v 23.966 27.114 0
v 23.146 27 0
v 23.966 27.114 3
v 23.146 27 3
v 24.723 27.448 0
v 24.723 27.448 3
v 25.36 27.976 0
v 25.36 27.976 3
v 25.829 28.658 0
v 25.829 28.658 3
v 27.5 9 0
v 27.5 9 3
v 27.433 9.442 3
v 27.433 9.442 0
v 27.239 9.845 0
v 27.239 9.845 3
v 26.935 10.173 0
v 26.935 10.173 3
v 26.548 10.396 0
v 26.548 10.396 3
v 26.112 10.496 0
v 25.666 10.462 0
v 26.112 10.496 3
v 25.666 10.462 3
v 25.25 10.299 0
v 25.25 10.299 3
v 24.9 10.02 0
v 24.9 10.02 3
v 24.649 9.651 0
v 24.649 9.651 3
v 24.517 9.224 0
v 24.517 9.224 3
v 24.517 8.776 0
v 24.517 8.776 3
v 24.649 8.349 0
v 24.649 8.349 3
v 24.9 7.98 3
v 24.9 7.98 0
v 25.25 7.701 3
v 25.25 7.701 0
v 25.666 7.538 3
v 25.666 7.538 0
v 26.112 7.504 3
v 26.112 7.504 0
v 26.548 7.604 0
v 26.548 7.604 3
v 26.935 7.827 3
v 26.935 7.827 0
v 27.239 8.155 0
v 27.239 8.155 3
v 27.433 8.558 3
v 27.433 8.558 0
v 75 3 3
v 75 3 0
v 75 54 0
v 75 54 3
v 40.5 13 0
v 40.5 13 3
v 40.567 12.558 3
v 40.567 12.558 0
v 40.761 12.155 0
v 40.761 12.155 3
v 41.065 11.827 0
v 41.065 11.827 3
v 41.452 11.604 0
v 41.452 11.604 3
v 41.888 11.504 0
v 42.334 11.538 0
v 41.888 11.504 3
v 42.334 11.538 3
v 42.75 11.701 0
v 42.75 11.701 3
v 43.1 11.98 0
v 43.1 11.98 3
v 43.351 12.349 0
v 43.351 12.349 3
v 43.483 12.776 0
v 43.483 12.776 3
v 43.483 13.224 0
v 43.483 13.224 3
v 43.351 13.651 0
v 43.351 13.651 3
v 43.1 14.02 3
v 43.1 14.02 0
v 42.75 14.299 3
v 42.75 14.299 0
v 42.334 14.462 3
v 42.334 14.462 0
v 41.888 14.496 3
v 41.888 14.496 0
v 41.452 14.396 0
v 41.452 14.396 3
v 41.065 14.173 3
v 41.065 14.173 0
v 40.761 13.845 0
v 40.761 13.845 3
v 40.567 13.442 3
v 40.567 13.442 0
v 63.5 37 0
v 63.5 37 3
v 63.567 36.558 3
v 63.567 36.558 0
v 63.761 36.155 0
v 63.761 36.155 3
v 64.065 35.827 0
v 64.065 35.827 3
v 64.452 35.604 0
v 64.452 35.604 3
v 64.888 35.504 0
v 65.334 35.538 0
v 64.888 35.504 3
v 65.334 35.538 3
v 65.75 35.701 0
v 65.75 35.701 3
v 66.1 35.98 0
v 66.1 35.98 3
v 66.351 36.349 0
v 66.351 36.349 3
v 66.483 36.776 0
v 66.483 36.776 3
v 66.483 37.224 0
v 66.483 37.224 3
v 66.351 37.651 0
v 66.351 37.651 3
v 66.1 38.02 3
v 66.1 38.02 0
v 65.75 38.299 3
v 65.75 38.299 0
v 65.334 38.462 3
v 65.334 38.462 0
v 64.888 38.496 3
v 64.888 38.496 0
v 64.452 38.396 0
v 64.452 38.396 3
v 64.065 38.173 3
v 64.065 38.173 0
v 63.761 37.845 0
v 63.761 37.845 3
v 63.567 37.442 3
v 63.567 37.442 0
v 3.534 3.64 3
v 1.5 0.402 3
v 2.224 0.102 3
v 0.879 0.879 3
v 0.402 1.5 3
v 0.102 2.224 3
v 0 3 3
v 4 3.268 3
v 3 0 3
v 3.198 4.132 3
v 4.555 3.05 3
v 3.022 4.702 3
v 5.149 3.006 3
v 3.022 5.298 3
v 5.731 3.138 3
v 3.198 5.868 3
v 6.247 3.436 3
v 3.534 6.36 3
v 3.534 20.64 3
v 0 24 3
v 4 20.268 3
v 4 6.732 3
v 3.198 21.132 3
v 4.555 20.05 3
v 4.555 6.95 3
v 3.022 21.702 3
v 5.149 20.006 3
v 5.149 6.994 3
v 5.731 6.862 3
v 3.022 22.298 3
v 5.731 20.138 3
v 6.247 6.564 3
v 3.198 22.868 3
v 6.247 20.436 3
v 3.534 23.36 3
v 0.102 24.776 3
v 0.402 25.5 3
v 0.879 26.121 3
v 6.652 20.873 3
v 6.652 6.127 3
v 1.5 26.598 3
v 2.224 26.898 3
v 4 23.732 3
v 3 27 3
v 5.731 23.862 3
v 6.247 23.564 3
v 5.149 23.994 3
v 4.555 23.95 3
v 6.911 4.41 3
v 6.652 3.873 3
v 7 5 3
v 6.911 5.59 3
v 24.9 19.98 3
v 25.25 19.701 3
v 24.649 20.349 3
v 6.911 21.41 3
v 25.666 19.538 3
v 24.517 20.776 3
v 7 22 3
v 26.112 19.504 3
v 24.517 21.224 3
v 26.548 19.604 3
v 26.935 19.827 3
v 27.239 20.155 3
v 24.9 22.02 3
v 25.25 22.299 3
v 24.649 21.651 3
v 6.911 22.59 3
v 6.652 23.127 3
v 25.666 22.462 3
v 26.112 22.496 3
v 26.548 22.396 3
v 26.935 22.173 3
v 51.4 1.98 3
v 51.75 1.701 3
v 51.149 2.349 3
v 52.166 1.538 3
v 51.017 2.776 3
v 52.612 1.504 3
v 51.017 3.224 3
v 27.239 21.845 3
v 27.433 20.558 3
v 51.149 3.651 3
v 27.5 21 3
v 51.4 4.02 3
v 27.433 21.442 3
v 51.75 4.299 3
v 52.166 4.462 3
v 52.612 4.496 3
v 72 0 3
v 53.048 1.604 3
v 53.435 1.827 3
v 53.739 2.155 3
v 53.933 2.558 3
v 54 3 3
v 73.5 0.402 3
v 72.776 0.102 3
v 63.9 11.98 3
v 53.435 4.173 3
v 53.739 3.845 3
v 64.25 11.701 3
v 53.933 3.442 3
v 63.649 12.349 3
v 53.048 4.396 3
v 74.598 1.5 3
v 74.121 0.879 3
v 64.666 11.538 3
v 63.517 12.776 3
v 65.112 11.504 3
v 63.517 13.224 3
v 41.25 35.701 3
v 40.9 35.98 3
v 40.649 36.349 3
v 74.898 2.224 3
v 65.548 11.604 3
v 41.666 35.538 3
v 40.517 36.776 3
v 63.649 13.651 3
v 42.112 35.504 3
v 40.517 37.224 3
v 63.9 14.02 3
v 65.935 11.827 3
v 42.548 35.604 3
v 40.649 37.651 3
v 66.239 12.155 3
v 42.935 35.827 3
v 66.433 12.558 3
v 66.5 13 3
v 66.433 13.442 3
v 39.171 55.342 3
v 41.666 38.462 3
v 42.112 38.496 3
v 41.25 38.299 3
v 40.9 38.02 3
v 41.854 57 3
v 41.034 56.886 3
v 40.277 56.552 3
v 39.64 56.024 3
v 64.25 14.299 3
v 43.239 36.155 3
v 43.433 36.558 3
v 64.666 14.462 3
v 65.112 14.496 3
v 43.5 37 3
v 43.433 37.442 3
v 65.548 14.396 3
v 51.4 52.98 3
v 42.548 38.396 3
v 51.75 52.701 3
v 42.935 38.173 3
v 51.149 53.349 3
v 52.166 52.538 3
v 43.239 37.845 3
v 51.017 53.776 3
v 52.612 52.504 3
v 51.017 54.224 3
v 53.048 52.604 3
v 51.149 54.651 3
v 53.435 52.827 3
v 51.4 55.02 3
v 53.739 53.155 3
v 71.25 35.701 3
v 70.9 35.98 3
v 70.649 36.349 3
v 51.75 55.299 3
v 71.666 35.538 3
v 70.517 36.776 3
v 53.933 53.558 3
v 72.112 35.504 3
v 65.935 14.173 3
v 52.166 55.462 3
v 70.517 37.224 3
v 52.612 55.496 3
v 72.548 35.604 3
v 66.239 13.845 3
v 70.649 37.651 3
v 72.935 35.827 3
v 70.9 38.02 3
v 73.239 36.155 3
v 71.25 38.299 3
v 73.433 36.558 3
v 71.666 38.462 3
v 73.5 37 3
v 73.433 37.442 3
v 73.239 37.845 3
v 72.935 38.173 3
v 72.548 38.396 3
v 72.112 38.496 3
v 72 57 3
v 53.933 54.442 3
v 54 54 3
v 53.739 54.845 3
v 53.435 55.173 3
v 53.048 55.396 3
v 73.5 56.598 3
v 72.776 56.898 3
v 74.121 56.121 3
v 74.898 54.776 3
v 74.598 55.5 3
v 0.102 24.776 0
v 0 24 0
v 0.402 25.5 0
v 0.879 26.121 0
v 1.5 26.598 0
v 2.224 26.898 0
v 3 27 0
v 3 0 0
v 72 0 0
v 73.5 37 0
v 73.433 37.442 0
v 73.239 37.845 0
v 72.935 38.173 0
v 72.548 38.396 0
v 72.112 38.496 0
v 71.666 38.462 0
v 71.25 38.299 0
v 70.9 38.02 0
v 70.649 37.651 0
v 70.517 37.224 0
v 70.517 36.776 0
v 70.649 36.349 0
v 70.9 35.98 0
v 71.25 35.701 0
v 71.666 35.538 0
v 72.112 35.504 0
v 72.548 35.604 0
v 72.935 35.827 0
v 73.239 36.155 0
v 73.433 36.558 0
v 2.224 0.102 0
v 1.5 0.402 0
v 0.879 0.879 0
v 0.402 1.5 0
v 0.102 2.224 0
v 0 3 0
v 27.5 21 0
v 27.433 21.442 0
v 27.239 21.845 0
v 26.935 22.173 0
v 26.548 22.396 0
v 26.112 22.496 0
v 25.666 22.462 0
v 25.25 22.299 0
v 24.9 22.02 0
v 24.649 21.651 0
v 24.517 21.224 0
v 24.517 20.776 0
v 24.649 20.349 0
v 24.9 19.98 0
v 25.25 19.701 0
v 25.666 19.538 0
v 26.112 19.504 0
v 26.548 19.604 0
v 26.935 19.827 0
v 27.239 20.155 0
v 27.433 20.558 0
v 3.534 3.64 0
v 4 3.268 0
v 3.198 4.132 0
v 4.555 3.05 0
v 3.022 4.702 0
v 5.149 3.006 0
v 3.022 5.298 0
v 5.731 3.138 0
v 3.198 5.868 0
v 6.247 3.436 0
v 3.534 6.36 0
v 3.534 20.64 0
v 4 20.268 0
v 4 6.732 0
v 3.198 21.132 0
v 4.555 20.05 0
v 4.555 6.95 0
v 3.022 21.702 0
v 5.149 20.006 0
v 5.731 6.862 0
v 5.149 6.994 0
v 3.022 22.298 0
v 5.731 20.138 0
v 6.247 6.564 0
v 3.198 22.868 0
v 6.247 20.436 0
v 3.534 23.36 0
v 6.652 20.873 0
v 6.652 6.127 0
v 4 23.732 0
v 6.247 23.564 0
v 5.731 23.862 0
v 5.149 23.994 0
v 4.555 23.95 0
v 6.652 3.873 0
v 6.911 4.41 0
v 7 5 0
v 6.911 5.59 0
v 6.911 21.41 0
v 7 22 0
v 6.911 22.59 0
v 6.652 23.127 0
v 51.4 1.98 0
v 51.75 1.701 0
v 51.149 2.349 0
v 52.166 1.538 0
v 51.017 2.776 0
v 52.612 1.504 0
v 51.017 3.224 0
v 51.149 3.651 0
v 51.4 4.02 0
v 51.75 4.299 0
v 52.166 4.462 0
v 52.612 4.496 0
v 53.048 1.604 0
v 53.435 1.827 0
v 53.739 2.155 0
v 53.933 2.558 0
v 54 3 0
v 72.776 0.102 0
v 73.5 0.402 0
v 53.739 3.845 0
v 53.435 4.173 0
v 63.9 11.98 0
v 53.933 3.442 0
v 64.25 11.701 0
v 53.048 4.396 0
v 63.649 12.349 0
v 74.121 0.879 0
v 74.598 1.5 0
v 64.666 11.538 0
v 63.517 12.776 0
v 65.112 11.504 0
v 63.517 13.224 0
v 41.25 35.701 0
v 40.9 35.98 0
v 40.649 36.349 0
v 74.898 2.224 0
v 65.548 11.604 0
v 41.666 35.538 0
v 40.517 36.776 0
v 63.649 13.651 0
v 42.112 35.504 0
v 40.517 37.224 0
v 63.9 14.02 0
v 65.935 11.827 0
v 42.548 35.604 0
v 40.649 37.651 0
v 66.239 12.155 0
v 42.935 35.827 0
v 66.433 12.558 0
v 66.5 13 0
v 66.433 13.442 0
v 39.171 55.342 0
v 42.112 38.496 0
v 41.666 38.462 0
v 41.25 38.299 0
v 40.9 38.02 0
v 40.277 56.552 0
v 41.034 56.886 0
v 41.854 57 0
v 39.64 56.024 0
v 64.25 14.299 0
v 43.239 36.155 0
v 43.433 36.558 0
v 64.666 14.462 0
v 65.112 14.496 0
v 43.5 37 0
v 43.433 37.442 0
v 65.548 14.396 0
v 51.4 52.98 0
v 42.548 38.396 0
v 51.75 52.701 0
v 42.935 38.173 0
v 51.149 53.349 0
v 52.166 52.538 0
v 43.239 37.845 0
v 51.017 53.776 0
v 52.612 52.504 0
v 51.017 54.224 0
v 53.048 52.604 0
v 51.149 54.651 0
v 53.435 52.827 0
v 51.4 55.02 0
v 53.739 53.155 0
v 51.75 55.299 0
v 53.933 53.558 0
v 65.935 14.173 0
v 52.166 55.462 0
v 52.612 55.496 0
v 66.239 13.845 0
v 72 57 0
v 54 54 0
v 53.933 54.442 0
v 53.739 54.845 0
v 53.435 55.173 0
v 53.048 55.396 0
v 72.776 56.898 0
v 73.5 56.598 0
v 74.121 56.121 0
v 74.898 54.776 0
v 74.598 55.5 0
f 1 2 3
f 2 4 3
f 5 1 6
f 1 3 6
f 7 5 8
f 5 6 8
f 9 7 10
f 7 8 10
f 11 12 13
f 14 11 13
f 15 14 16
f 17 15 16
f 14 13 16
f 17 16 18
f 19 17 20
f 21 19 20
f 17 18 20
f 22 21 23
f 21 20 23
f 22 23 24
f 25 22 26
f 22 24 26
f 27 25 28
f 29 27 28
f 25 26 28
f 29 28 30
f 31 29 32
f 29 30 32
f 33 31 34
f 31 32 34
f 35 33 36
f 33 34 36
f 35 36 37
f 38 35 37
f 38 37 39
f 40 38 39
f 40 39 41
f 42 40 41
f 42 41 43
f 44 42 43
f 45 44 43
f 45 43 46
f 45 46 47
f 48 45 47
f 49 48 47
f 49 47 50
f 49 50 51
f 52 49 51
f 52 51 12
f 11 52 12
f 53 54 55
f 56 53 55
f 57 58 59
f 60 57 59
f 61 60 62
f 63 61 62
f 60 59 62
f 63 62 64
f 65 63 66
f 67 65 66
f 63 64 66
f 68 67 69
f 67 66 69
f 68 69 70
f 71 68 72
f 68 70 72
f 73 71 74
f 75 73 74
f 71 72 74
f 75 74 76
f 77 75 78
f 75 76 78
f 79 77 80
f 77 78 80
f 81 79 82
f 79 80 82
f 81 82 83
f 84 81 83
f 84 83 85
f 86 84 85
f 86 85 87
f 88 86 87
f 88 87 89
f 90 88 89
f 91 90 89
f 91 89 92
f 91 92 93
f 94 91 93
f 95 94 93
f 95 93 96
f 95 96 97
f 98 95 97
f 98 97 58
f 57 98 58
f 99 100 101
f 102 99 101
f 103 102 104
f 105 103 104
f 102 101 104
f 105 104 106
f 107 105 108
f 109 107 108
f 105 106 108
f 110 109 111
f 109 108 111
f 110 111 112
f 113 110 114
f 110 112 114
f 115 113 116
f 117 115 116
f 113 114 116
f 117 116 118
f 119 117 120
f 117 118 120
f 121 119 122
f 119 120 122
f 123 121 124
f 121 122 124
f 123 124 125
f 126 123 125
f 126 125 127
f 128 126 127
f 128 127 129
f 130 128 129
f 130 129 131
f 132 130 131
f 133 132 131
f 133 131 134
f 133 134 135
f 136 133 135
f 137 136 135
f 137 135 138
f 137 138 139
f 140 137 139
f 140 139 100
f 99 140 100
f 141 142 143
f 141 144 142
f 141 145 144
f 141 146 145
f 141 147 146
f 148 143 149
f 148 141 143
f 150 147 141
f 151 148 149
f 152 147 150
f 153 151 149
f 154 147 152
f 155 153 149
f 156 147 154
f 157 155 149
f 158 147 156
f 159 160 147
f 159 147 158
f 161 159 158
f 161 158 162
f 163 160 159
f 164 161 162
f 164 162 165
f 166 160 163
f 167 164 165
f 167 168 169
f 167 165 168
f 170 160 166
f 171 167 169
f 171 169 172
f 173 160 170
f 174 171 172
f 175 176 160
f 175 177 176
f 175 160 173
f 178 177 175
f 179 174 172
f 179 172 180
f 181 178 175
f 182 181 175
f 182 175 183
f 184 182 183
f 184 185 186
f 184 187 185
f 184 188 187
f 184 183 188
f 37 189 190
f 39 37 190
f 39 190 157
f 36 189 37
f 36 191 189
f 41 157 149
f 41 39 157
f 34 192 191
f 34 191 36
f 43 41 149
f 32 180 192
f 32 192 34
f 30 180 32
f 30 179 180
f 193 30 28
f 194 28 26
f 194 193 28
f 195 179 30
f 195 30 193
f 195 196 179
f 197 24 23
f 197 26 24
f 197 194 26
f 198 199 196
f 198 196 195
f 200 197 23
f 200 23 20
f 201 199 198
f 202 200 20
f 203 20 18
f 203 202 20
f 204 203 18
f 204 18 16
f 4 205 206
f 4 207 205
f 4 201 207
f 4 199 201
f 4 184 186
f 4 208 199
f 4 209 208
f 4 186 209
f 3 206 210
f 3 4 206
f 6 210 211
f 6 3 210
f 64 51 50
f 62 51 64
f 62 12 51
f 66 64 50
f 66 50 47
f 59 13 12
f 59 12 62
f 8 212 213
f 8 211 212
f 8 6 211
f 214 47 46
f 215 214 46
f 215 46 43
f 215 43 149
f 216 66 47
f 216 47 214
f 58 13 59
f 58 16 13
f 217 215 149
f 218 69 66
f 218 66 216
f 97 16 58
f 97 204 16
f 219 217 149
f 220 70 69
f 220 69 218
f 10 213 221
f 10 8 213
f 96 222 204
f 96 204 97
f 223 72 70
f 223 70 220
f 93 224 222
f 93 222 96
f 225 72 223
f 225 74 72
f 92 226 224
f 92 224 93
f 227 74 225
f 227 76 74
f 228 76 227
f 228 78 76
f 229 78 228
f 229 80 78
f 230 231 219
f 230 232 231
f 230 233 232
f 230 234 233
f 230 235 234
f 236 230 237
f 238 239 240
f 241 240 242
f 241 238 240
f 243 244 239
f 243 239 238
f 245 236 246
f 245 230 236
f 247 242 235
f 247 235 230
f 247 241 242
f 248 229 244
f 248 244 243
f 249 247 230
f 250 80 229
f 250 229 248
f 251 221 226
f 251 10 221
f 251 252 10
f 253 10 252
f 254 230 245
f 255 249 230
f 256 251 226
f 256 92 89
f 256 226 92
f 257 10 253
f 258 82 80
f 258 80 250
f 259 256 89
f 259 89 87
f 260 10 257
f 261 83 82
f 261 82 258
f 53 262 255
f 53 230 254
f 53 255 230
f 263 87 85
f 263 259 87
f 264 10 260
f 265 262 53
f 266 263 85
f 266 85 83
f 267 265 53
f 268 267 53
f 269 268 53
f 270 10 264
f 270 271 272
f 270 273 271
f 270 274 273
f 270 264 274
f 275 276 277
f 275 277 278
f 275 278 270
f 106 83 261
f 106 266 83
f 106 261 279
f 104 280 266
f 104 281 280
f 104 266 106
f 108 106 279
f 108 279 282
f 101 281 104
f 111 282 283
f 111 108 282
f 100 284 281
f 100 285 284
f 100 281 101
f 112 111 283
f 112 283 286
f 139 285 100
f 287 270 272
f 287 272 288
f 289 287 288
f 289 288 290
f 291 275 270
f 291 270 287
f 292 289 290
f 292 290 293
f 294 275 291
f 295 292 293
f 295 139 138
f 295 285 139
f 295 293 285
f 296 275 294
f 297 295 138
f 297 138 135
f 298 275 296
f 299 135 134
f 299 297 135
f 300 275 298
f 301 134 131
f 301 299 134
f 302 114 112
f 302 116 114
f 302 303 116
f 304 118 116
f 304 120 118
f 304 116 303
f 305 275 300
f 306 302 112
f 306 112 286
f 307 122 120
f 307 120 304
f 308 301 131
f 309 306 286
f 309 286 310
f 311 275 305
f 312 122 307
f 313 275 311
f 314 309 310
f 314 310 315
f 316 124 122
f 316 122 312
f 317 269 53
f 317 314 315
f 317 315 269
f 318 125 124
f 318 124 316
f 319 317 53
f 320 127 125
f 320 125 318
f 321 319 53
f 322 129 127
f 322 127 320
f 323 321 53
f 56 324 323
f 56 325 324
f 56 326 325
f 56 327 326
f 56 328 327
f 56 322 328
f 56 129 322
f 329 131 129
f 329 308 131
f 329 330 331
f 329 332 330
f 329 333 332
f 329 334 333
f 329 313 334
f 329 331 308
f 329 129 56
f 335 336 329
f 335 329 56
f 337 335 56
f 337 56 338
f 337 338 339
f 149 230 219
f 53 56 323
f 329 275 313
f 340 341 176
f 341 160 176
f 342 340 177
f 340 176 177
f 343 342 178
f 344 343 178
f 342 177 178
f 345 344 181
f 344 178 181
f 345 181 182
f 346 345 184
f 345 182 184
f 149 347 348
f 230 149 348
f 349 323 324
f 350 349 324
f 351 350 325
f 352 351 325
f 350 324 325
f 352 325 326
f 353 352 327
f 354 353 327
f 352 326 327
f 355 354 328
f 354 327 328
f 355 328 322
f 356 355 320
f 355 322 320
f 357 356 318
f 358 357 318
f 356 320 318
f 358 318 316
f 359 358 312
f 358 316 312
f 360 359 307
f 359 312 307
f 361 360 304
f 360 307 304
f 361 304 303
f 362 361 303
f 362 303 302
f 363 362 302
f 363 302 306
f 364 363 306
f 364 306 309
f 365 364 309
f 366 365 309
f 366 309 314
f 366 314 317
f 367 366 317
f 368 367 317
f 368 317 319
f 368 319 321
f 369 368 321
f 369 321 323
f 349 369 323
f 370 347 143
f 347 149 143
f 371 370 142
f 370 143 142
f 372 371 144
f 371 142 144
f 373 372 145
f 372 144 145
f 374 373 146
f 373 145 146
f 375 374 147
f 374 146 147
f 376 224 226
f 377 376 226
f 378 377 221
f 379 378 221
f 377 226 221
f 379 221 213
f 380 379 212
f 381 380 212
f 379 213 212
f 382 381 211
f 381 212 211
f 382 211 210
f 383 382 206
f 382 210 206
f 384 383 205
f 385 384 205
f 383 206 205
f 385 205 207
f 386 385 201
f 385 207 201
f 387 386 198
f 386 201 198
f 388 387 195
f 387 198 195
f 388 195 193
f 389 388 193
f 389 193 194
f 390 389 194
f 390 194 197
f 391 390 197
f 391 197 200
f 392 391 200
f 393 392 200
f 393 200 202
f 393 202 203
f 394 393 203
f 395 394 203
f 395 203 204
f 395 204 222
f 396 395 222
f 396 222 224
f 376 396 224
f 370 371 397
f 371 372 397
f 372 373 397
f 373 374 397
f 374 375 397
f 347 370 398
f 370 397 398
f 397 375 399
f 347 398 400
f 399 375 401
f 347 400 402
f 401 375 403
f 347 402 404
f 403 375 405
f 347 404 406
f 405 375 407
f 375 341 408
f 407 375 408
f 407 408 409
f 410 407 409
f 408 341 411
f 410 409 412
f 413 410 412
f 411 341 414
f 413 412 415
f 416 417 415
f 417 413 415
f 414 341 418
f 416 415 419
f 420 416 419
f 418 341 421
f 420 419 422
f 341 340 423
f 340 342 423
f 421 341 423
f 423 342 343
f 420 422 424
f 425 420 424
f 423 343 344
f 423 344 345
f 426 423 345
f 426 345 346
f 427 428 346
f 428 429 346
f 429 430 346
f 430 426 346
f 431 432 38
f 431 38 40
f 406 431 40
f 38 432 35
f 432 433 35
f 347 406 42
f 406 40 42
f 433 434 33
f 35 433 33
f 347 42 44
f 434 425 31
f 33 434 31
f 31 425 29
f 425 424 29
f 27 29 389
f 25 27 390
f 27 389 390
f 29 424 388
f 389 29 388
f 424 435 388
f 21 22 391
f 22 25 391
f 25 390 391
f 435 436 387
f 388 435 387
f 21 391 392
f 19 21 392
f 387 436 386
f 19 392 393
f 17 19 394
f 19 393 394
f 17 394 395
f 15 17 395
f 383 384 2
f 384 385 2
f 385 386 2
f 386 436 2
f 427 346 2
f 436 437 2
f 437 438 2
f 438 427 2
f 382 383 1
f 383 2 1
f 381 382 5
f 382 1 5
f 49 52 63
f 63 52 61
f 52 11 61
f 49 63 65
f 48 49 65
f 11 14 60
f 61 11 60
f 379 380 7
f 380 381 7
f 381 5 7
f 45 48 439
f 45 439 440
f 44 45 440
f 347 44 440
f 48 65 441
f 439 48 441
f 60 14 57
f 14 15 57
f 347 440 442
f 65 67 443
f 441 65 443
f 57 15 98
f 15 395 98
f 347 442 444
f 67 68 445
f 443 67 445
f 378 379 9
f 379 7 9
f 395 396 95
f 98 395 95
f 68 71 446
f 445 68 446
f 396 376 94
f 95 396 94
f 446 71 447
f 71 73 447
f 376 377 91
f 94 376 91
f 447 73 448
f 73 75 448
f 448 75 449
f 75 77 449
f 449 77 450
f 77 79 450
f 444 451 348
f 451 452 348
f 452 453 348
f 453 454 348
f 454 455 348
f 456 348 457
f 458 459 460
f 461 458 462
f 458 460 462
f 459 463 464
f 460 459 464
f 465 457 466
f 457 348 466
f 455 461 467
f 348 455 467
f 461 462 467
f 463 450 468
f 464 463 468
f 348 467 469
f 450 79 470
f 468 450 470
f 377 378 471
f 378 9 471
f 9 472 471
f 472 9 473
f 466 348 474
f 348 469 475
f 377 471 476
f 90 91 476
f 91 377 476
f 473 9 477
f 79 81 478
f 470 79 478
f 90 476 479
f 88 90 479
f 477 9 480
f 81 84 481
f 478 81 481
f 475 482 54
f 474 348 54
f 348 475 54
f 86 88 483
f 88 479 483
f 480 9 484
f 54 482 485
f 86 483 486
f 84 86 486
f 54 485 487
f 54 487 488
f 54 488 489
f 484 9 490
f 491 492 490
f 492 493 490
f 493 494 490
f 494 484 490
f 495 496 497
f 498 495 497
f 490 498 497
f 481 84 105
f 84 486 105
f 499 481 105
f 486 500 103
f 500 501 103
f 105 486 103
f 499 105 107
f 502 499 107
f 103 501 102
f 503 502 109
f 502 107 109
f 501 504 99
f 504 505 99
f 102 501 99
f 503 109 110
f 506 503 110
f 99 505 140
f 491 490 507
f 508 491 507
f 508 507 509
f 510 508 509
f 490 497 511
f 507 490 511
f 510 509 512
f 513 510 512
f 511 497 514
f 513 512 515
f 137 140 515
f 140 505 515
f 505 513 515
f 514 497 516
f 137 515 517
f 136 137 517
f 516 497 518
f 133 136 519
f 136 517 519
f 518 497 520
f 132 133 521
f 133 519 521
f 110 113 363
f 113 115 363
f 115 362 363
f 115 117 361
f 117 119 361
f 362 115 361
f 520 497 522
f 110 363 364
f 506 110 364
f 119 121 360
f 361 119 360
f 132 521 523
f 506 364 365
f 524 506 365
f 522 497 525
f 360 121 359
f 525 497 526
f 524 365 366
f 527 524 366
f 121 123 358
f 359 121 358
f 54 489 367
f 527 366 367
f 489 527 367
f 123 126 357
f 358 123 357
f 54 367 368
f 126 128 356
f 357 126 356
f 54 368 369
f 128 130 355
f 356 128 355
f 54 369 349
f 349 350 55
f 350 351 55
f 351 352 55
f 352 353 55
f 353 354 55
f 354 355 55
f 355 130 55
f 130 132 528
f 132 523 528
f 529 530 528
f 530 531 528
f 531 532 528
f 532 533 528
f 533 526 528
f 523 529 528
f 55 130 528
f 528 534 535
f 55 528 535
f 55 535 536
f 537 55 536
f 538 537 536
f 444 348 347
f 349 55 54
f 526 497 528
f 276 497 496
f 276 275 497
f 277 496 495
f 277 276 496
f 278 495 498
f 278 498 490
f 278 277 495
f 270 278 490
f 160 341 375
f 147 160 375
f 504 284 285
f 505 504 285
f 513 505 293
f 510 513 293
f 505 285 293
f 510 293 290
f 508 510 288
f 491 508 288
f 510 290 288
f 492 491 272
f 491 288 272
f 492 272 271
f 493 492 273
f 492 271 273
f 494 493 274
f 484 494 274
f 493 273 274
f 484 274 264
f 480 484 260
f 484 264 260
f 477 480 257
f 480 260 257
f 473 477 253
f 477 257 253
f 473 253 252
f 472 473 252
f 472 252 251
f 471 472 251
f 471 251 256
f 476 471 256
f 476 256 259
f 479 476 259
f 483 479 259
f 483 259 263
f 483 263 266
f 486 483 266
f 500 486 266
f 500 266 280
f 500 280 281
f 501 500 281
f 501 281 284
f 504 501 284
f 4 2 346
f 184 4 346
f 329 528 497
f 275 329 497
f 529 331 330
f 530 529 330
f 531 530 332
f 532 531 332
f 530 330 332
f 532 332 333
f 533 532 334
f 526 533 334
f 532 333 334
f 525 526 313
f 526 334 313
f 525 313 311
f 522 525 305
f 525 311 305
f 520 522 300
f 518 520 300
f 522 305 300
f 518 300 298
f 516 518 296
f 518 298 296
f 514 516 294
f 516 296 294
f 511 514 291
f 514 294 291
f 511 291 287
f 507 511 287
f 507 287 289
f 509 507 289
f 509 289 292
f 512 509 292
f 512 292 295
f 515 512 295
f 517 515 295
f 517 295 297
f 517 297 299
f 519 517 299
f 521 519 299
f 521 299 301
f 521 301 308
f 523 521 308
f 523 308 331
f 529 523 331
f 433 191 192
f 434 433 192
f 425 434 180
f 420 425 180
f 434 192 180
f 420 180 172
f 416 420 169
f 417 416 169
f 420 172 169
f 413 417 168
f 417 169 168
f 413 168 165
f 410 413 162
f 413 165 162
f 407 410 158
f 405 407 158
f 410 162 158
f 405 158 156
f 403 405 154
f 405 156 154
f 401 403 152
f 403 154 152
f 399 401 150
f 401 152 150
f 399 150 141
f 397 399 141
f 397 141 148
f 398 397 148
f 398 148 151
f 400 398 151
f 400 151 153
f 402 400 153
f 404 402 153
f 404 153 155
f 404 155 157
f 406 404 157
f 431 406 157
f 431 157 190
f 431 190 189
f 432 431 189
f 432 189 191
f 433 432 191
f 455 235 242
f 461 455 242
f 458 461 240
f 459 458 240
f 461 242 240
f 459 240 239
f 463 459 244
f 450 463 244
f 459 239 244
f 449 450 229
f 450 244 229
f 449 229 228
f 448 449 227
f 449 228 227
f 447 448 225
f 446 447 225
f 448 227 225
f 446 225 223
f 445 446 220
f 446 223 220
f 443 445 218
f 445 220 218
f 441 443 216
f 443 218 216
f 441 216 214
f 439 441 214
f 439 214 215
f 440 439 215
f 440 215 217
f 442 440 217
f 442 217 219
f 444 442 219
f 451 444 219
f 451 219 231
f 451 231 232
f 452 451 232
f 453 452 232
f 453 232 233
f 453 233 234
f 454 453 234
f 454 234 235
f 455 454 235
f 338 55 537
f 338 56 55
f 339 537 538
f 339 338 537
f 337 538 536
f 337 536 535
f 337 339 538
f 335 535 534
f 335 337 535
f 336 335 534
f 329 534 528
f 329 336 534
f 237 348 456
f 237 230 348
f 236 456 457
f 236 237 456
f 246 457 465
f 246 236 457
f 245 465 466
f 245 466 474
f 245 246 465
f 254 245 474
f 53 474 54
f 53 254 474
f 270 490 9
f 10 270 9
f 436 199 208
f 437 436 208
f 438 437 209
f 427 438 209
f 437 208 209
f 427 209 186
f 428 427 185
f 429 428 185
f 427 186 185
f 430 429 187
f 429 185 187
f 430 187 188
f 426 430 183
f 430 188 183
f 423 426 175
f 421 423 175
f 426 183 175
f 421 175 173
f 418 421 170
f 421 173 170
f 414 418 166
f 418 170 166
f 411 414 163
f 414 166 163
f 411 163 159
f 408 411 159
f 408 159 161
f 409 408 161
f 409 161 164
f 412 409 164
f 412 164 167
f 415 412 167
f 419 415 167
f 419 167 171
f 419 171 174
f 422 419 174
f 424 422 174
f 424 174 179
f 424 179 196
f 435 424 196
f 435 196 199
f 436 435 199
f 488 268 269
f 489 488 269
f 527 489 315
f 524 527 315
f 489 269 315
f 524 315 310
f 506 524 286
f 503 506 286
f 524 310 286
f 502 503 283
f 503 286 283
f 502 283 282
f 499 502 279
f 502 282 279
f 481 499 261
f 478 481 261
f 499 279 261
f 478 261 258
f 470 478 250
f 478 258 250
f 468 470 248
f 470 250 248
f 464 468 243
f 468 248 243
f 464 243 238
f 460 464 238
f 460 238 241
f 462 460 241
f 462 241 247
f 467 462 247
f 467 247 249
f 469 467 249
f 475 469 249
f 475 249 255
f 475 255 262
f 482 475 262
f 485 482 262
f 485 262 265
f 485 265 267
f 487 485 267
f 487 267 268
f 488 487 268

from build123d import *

# Parameters (mm, degrees)
BOSS_EXTRU_1_DEPTH      = 3
ESQUISSE2_R             = 1.5
ENL_V_MAT_EXTRU_1_DEPTH = 95.249668434
ESQUISSE3_R             = 2
ESQUISSE3_R_2           = 1.5
ENL_V_MAT_EXTRU_2_DEPTH = 95.249668434
CONG_1_R                = 3
ESQUISSE4_R             = 1.5
ENL_V_MAT_EXTRU_3_DEPTH = 95.249668434


with BuildPart() as part:
    # Esquisse1 → Boss.-Extru.1 (new body)
    with BuildSketch(Plane.XY):
        Polygon((0, 0), (75, 0), (75, 57), (40, 57), (25, 27), (0, 27), align=None)
    extrude(amount=BOSS_EXTRU_1_DEPTH)

    # Esquisse2 → Enlèv. mat.-Extru.1 (cut, through all)
    with BuildSketch(Plane.XY.offset(3)):
        with Locations((42, 37)):
            Circle(ESQUISSE2_R)
        with Locations(Location((42, 13, 0), (0, 0, 180))):
            Circle(ESQUISSE2_R)
        with Locations((65, 13)):
            Circle(ESQUISSE2_R)
        with Locations(Location((65, 37, 0), (0, 0, 180))):
            Circle(ESQUISSE2_R)
    extrude(amount=-ENL_V_MAT_EXTRU_1_DEPTH, mode=Mode.SUBTRACT)

    # Esquisse3 → Enlèv. mat.-Extru.2 (cut, through all)
    with BuildSketch(Plane.XY.offset(3)):
        with Locations((5, 22)):
            Circle(ESQUISSE3_R)
        with Locations((5, 5)):
            Circle(ESQUISSE3_R)
        with Locations((52.5, 3)):
            Circle(ESQUISSE3_R_2)
        with Locations((52.5, 54)):
            Circle(ESQUISSE3_R_2)
        with Locations((72, 37)):
            Circle(ESQUISSE3_R_2)
    extrude(amount=-ENL_V_MAT_EXTRU_2_DEPTH, mode=Mode.SUBTRACT)

    # Congé1
    cong_1_edges = [part.edges().sort_by_distance(p)[0] for p in [
        (0, 27, 1.5),
        (25, 27, 1.5),
        (40, 57, 1.5),
        (75, 57, 1.5),
        (75, 0, 1.5),
        (0, 0, 1.5),
    ]]
    fillet(cong_1_edges, radius=CONG_1_R)

    # Esquisse4 → Enlèv. mat.-Extru.3 (cut, through all)
    with BuildSketch(Plane.XY.offset(3)):
        with Locations((26, 21)):
            Circle(ESQUISSE4_R)
        with Locations((26, 9)):
            Circle(ESQUISSE4_R)
    extrude(amount=-ENL_V_MAT_EXTRU_3_DEPTH, mode=Mode.SUBTRACT)


solid = part.part
